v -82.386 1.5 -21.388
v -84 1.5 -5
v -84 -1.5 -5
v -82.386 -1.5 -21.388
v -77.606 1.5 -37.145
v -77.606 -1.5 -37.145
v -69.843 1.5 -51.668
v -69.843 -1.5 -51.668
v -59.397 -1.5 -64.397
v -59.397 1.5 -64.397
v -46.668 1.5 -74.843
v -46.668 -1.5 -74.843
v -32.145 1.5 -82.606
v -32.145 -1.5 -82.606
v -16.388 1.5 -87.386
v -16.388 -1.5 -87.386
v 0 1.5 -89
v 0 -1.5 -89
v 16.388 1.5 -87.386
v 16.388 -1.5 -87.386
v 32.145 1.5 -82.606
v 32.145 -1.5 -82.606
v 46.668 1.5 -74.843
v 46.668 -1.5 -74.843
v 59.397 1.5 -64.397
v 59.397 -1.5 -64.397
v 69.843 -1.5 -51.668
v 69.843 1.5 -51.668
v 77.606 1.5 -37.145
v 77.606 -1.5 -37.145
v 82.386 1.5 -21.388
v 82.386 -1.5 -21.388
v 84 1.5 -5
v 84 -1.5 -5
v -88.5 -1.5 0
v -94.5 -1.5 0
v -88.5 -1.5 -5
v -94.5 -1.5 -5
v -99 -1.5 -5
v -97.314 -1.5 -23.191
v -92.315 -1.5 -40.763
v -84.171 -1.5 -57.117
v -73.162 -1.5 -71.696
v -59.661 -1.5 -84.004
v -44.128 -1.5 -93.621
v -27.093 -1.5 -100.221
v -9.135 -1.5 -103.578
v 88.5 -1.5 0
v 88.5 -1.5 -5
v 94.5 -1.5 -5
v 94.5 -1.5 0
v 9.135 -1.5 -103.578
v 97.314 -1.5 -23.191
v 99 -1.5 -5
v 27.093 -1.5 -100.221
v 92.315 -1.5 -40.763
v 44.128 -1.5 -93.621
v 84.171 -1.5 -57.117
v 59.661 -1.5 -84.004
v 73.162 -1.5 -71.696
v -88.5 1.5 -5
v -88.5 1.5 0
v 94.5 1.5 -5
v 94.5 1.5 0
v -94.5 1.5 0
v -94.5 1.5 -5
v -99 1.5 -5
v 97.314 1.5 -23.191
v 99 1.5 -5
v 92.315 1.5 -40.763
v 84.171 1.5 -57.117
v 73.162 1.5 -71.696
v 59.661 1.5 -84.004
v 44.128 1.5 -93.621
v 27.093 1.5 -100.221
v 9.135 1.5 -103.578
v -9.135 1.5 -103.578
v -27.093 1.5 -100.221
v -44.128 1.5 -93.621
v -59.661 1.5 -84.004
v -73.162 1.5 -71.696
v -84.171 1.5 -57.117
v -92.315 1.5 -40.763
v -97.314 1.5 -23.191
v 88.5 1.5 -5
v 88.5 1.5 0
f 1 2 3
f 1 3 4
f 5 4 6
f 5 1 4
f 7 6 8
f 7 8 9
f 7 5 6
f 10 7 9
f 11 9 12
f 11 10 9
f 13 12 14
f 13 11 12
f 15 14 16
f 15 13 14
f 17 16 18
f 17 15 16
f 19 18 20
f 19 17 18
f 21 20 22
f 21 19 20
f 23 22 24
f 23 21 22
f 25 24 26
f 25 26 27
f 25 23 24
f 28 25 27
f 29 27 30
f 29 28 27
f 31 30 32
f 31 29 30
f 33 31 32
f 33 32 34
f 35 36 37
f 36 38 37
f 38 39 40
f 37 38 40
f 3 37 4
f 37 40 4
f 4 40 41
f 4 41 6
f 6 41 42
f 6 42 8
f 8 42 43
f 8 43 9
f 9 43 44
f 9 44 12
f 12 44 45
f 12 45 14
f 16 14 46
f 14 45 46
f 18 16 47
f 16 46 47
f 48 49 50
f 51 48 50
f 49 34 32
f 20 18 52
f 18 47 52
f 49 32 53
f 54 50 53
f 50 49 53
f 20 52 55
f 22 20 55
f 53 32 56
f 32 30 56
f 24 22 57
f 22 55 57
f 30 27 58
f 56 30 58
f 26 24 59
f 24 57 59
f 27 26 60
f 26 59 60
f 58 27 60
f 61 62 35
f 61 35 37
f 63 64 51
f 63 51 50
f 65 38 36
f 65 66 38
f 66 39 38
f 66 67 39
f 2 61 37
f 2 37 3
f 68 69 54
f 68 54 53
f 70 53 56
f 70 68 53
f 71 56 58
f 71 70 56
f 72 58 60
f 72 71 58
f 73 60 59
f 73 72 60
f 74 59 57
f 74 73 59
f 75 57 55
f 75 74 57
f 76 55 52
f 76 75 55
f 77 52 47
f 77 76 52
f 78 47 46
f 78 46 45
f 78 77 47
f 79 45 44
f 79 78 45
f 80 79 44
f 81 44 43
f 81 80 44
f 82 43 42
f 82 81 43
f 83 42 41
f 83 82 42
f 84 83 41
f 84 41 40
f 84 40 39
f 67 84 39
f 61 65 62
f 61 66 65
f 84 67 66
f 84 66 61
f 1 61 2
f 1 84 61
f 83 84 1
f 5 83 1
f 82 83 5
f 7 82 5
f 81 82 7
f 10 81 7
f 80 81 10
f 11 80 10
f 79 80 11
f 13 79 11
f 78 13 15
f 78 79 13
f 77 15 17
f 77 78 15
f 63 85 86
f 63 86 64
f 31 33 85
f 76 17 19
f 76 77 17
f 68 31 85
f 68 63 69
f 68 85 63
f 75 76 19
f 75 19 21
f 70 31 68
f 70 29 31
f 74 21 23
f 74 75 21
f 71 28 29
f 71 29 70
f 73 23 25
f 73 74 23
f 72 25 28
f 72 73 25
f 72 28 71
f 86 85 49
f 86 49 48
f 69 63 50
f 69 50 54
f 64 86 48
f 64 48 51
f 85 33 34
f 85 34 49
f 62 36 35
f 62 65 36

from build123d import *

# Parameters (mm, degrees)
BOSS_EXTRUDE1_DEPTH = 1.5


with BuildPart() as part:
    # Sketch1 → Boss-Extrude1 (new body, symmetric)
    with BuildSketch(Plane(origin=(0, 0, 0), x_dir=(1, 0, 0), z_dir=(0, 1, 0))):
        with BuildLine():
            Line((-94.5, 0), (-88.5, 0))
            Line((-88.5, 0), (-88.5, 5))
            Line((-88.5, 5), (-84, 5))
            ThreePointArc((-84, 5), (0, 89), (84, 5))
            Line((84, 5), (88.5, 5))
            Line((88.5, 5), (88.5, 0))
            Line((88.5, 0), (94.5, 0))
            Line((94.5, 0), (94.5, 5))
            Line((94.5, 5), (99, 5))
            ThreePointArc((99, 5), (0, 104), (-99, 5))
            Line((-99, 5), (-94.5, 5))
            Line((-94.5, 5), (-94.5, 0))
        make_face()
    extrude(amount=BOSS_EXTRUDE1_DEPTH, both=True)


solid = part.part
